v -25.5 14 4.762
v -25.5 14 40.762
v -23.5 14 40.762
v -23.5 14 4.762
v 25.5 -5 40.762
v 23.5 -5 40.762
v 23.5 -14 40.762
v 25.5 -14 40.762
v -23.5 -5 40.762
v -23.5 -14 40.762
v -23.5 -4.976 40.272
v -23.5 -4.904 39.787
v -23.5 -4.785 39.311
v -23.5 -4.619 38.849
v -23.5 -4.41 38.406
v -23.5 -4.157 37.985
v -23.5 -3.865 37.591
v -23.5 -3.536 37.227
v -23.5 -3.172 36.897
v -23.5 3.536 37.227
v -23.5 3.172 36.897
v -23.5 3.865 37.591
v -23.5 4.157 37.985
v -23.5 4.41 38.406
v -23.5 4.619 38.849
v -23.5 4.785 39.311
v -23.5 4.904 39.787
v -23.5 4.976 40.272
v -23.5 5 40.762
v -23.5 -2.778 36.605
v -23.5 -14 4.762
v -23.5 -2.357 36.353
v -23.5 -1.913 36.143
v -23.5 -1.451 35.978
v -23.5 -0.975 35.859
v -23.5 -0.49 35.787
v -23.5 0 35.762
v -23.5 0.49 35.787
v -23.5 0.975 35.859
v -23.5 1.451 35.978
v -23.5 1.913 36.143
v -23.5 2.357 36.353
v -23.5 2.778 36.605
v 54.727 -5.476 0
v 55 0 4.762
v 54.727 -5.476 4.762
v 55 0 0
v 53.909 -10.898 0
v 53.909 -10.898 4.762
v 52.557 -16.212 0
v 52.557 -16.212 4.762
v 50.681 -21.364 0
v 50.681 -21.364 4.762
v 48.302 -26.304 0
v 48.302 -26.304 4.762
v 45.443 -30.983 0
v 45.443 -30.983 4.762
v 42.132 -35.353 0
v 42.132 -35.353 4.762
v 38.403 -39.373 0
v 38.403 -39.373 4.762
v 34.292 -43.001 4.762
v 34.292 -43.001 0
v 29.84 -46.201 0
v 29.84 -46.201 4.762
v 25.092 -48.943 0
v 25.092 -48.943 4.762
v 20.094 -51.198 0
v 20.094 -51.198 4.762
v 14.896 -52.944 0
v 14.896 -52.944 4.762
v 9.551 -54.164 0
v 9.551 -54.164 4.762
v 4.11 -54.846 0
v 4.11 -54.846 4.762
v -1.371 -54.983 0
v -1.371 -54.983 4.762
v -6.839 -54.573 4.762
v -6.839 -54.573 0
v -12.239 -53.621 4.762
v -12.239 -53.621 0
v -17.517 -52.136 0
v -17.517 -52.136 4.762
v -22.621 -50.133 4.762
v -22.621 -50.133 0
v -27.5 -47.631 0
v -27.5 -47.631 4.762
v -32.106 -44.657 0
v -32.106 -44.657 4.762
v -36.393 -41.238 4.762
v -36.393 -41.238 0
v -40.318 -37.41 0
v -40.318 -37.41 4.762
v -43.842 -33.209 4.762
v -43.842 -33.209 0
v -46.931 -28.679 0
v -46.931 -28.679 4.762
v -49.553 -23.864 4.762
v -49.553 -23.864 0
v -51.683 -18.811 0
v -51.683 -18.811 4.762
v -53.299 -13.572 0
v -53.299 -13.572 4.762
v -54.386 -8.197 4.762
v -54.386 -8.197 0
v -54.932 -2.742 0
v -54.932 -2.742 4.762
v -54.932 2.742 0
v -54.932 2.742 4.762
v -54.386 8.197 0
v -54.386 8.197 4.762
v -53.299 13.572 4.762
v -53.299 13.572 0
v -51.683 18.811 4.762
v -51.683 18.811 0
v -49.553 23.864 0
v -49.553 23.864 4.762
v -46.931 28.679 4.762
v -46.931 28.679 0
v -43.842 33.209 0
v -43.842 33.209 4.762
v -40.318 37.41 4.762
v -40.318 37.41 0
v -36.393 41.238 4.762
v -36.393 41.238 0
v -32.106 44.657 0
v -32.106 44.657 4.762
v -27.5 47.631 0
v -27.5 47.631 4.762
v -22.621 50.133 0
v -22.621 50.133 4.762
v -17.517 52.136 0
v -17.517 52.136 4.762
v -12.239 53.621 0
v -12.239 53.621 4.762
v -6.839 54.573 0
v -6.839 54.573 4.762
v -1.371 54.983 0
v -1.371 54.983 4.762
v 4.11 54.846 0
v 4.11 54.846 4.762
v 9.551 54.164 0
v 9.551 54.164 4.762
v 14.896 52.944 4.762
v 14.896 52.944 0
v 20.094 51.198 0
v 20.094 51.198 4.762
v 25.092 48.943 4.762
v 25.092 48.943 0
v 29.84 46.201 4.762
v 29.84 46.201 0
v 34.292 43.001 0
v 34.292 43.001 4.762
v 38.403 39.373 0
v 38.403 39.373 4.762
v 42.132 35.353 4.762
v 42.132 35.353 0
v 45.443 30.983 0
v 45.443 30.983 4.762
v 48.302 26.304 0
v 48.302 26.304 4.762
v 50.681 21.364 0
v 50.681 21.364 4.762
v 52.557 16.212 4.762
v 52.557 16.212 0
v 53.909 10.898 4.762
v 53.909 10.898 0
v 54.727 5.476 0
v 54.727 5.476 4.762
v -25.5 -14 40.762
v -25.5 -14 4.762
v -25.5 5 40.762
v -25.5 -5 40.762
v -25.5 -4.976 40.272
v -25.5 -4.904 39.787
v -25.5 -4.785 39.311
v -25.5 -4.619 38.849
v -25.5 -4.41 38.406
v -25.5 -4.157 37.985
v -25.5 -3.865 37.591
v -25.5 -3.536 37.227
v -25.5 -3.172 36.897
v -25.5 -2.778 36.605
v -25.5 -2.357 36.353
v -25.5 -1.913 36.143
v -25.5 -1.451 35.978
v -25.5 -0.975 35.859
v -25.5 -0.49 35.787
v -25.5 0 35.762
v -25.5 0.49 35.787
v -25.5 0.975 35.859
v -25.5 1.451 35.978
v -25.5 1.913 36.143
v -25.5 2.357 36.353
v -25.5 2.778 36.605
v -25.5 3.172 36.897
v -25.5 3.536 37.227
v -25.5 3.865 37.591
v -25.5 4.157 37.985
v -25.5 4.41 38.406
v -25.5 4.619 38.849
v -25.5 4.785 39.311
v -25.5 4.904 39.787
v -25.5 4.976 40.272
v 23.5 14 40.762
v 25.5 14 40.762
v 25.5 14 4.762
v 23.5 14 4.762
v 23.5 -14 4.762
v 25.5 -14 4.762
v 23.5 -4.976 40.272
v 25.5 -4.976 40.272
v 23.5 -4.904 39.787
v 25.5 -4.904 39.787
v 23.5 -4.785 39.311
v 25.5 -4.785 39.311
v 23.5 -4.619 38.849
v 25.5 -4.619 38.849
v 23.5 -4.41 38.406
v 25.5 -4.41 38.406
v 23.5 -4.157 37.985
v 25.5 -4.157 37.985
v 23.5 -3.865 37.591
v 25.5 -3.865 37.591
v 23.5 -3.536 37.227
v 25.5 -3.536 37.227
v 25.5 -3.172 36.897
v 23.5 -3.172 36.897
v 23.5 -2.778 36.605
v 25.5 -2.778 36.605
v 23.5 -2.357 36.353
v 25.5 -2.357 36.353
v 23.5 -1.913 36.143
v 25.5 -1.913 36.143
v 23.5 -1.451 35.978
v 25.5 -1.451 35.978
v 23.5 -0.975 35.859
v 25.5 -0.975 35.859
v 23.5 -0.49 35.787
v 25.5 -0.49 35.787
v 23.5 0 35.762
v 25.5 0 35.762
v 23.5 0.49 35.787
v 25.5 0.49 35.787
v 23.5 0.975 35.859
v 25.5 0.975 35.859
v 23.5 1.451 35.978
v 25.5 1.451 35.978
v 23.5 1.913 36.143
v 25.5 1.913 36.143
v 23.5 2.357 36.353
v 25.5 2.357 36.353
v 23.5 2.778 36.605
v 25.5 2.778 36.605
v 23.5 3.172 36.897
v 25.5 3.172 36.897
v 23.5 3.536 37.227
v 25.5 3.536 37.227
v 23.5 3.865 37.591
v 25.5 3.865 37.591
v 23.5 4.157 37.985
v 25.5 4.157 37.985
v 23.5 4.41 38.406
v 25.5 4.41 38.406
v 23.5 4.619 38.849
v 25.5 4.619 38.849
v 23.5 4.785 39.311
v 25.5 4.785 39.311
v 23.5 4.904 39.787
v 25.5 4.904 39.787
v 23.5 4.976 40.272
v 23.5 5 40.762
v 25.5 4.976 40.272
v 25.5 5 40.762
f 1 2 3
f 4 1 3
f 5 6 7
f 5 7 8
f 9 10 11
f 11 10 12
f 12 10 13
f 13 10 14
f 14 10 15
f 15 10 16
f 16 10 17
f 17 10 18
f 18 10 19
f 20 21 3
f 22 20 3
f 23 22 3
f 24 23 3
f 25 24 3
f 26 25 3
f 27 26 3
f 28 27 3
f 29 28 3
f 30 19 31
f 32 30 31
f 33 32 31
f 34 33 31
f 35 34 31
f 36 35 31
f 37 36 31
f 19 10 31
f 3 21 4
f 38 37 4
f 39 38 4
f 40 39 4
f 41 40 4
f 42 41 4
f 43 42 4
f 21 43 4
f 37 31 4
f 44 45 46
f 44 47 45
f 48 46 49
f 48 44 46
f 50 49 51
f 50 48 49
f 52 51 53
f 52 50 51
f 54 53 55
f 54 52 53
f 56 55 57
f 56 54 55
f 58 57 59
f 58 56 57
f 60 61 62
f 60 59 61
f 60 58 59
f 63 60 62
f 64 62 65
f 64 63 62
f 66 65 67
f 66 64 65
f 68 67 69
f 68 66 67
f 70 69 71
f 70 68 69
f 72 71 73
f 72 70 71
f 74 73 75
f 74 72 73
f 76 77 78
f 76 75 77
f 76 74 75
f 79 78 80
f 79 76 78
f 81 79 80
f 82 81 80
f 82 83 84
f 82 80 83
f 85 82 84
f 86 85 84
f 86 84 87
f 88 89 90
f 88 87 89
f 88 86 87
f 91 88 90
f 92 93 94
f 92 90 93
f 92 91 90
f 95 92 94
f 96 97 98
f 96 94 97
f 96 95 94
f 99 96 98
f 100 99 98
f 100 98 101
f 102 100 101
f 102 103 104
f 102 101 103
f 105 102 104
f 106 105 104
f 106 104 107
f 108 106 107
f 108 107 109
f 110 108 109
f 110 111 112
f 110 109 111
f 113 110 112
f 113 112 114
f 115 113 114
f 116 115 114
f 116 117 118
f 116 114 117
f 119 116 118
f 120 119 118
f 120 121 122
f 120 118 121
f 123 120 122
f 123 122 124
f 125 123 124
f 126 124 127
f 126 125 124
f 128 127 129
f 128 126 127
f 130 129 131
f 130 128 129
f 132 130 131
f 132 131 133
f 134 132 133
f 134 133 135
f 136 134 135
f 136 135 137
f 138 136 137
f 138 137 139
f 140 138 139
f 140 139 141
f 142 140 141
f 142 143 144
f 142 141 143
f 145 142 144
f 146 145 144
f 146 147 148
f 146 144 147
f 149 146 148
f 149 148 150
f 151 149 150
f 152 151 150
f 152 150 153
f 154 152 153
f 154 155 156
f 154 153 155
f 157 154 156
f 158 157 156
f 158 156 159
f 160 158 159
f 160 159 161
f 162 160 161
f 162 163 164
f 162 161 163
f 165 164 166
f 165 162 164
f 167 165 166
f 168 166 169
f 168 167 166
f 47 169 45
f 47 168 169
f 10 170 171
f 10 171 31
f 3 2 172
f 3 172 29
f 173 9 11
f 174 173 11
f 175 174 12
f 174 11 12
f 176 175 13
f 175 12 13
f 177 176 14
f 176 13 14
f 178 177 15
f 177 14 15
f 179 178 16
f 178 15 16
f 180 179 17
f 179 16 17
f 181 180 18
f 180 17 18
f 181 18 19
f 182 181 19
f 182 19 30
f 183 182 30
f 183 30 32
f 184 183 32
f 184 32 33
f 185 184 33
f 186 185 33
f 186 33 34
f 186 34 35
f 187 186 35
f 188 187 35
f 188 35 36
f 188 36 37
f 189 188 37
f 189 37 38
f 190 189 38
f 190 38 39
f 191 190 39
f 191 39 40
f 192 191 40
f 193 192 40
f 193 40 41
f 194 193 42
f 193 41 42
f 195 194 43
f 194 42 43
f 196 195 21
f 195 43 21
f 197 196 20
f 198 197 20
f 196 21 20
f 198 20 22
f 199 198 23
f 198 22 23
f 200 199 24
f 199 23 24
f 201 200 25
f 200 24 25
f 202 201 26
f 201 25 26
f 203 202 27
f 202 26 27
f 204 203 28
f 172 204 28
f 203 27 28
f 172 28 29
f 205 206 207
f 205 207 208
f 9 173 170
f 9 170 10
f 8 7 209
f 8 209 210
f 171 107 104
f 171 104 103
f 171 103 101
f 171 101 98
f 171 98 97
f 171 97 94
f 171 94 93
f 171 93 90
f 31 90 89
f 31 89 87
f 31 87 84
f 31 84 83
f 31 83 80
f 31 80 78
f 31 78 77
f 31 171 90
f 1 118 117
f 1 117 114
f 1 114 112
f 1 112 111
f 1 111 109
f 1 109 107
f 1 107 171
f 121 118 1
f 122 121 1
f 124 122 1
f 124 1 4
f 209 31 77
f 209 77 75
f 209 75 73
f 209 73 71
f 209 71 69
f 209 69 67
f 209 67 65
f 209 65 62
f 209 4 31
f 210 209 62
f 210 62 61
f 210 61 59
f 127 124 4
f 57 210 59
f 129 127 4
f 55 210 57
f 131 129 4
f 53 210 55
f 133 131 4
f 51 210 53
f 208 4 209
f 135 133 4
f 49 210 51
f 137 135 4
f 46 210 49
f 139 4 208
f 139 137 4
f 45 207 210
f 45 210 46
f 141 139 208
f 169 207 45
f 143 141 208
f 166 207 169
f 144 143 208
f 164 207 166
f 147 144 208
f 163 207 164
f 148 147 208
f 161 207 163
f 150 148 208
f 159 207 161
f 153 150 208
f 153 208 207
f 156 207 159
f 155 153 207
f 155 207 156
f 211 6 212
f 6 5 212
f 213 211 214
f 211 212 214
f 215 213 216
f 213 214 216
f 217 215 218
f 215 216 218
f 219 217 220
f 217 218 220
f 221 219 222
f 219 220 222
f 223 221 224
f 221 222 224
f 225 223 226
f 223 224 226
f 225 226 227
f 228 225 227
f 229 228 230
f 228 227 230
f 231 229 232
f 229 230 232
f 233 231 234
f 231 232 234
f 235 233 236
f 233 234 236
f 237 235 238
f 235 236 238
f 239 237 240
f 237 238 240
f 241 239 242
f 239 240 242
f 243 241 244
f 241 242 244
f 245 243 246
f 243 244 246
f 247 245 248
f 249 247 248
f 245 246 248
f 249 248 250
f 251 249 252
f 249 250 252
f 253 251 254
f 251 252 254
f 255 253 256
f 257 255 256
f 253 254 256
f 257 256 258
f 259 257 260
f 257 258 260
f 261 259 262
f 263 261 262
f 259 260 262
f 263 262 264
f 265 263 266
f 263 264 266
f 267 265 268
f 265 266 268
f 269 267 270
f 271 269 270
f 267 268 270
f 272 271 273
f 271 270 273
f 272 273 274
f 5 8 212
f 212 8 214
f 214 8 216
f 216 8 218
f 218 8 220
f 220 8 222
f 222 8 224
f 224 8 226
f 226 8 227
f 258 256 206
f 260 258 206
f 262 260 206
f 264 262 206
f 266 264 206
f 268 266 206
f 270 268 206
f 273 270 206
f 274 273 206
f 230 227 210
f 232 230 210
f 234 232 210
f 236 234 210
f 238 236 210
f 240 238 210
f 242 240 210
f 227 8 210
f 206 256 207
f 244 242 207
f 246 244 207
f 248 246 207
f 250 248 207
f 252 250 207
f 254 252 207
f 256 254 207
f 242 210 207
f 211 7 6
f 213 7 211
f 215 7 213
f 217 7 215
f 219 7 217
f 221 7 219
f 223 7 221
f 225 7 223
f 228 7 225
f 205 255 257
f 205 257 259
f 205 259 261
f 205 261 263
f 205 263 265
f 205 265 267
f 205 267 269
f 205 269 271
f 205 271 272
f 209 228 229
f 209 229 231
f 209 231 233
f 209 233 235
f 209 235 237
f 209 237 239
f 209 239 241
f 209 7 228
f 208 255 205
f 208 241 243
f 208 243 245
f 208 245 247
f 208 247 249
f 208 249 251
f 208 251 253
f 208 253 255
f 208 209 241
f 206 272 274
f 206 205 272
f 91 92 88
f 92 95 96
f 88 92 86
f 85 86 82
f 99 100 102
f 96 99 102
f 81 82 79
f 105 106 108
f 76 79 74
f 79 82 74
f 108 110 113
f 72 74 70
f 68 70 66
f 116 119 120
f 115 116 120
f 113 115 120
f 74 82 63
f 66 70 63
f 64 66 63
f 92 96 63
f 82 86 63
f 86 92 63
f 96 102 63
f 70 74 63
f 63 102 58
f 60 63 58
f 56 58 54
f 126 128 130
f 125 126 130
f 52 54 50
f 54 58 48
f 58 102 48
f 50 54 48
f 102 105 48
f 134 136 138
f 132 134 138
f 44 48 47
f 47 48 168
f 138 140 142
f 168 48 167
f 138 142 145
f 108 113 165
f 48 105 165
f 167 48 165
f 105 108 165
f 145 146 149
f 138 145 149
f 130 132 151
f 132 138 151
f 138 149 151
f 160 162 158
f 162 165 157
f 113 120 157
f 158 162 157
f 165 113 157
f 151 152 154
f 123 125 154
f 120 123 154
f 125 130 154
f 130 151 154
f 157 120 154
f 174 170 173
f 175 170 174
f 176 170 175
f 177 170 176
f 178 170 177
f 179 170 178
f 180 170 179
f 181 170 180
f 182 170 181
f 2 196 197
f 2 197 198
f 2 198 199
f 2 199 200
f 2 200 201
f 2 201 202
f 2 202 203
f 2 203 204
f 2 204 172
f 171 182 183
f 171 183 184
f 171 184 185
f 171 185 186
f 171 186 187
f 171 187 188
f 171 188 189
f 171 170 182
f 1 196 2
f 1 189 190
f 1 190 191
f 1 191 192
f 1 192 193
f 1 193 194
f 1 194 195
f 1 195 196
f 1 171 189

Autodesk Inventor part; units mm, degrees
ref_plane "YZ Plane" through (0, 0, 0) normal (1, 0, 0) x (0, 1, 0)
ref_plane "XZ Plane" through (0, 0, 0) normal (0, 1, 0) x (-1, 0, 0)
ref_plane "XY Plane" through (0, 0, 0) normal (0, 0, 1) x (1, 0, 0)
sketch "Sketch1" plane through (0, 0, 0) normal (0, 0, 1) x (1, 0, 0)
  circle A0 centre (0, 0) radius 55
  line L0 (23.5, -14) -> (23.5, 14)
  line L1 (-23.5, -14) -> (-23.5, 14)
  line L2 (-25.5, -14) -> (-25.5, 14)
  line L3 (25.5, -14) -> (25.5, 14)
  line L4 (25.5, 14) -> (23.5, 14)
  line L5 (23.5, -14) -> (25.5, -14)
  line L6 (-25.5, -14) -> (-23.5, -14)
  line L7 (-25.5, 14) -> (-23.5, 14)
extrude "Extrusion1" add sketch "Sketch1" along normal blind 4.7625
extrude "Extrusion2" add sketch "Sketch1" along normal blind 40.7625 contours L0 L4 L3 L5 | L6 L2 L7 L1
sketch "Sketch2" plane through (25.5, -14, 4.7625) normal (1, 0, 0) x (0, 0, -1)
  line L0 (-36, 28) -> (-36, 0) projected
  line L1 (-39, 7) -> (-39, 2.0417)
  arc A0 (-39, 2.0417) -> (-37.1667, 0.0487) centre (-37, 2.0417) ccw
  arc A1 (-37.1667, 0.0487) -> (-36, 0) centre (-36, 14) ccw
  line L2 (-2, 0) -> (-36, 0)
  line L3 (-2, 28) -> (-2, 0)
  line L4 (-2, 28) -> (-36, 28)
  arc A2 (-36, 28) -> (-37.1667, 27.9513) centre (-36, 14) ccw
  arc A3 (-37.1667, 27.9513) -> (-39, 25.9583) centre (-37, 25.9583) ccw
  line L5 (-39, 25.9583) -> (-39, 21)
  arc A4 (-39, 21) -> (-37, 19) centre (-37, 21) ccw
  line L6 (-37, 19) -> (-36, 19)
  arc A5 (-36, 9) -> (-36, 19) centre (-36, 14) ccw
  line L7 (-37, 9) -> (-36, 9)
  arc A6 (-37, 9) -> (-39, 7) centre (-37, 7) ccw
  circle A7 centre (-36, 25) radius 1.25
  circle A8 centre (-28.2218, 21.7782) radius 1.25
  circle A9 centre (-25, 14) radius 1.25
  circle A10 centre (-28.2218, 6.2218) radius 1.25
  circle A11 centre (-36, 3) radius 1.25
  circle A12 centre (-15, 6) radius 1.05
  circle A13 centre (-15, 22) radius 1.05
  line L8 (-8, 6) -> (-11, 6)
  arc A14 (-12, 7) -> (-11, 6) centre (-11, 7) ccw
  line L9 (-12, 7) -> (-12, 21)
  arc A15 (-11, 22) -> (-12, 21) centre (-11, 21) ccw
  line L10 (-8, 22) -> (-11, 22)
  arc A16 (-7, 21) -> (-8, 22) centre (-8, 21) ccw
  line L11 (-7, 21) -> (-7, 7)
  arc A17 (-8, 6) -> (-7, 7) centre (-8, 7) ccw
  line L12 (-18, 21) -> (-18, 7)
  arc A18 (-19, 6) -> (-18, 7) centre (-19, 7) ccw
  line L13 (-19, 6) -> (-21, 6)
  arc A19 (-22, 7) -> (-21, 6) centre (-21, 7) ccw
  line L14 (-22, 7) -> (-22, 21)
  arc A20 (-21, 22) -> (-22, 21) centre (-21, 21) ccw
  line L15 (-21, 22) -> (-19, 22)
  arc A21 (-18, 21) -> (-19, 22) centre (-19, 21) ccw
  circle A22 centre (-36, 6) radius 1
  circle A23 centre (-28, 14) radius 1
  circle A24 centre (-36, 22) radius 1
  line L16 (-36, 19) -> (-36, 9)
  point P0 (4.7625, 14)
  point P1 (-36, 14)
extrude "Extrusion3" cut sketch "Sketch2" against normal through all contours A5 L0
properties part number "Shoulder"
